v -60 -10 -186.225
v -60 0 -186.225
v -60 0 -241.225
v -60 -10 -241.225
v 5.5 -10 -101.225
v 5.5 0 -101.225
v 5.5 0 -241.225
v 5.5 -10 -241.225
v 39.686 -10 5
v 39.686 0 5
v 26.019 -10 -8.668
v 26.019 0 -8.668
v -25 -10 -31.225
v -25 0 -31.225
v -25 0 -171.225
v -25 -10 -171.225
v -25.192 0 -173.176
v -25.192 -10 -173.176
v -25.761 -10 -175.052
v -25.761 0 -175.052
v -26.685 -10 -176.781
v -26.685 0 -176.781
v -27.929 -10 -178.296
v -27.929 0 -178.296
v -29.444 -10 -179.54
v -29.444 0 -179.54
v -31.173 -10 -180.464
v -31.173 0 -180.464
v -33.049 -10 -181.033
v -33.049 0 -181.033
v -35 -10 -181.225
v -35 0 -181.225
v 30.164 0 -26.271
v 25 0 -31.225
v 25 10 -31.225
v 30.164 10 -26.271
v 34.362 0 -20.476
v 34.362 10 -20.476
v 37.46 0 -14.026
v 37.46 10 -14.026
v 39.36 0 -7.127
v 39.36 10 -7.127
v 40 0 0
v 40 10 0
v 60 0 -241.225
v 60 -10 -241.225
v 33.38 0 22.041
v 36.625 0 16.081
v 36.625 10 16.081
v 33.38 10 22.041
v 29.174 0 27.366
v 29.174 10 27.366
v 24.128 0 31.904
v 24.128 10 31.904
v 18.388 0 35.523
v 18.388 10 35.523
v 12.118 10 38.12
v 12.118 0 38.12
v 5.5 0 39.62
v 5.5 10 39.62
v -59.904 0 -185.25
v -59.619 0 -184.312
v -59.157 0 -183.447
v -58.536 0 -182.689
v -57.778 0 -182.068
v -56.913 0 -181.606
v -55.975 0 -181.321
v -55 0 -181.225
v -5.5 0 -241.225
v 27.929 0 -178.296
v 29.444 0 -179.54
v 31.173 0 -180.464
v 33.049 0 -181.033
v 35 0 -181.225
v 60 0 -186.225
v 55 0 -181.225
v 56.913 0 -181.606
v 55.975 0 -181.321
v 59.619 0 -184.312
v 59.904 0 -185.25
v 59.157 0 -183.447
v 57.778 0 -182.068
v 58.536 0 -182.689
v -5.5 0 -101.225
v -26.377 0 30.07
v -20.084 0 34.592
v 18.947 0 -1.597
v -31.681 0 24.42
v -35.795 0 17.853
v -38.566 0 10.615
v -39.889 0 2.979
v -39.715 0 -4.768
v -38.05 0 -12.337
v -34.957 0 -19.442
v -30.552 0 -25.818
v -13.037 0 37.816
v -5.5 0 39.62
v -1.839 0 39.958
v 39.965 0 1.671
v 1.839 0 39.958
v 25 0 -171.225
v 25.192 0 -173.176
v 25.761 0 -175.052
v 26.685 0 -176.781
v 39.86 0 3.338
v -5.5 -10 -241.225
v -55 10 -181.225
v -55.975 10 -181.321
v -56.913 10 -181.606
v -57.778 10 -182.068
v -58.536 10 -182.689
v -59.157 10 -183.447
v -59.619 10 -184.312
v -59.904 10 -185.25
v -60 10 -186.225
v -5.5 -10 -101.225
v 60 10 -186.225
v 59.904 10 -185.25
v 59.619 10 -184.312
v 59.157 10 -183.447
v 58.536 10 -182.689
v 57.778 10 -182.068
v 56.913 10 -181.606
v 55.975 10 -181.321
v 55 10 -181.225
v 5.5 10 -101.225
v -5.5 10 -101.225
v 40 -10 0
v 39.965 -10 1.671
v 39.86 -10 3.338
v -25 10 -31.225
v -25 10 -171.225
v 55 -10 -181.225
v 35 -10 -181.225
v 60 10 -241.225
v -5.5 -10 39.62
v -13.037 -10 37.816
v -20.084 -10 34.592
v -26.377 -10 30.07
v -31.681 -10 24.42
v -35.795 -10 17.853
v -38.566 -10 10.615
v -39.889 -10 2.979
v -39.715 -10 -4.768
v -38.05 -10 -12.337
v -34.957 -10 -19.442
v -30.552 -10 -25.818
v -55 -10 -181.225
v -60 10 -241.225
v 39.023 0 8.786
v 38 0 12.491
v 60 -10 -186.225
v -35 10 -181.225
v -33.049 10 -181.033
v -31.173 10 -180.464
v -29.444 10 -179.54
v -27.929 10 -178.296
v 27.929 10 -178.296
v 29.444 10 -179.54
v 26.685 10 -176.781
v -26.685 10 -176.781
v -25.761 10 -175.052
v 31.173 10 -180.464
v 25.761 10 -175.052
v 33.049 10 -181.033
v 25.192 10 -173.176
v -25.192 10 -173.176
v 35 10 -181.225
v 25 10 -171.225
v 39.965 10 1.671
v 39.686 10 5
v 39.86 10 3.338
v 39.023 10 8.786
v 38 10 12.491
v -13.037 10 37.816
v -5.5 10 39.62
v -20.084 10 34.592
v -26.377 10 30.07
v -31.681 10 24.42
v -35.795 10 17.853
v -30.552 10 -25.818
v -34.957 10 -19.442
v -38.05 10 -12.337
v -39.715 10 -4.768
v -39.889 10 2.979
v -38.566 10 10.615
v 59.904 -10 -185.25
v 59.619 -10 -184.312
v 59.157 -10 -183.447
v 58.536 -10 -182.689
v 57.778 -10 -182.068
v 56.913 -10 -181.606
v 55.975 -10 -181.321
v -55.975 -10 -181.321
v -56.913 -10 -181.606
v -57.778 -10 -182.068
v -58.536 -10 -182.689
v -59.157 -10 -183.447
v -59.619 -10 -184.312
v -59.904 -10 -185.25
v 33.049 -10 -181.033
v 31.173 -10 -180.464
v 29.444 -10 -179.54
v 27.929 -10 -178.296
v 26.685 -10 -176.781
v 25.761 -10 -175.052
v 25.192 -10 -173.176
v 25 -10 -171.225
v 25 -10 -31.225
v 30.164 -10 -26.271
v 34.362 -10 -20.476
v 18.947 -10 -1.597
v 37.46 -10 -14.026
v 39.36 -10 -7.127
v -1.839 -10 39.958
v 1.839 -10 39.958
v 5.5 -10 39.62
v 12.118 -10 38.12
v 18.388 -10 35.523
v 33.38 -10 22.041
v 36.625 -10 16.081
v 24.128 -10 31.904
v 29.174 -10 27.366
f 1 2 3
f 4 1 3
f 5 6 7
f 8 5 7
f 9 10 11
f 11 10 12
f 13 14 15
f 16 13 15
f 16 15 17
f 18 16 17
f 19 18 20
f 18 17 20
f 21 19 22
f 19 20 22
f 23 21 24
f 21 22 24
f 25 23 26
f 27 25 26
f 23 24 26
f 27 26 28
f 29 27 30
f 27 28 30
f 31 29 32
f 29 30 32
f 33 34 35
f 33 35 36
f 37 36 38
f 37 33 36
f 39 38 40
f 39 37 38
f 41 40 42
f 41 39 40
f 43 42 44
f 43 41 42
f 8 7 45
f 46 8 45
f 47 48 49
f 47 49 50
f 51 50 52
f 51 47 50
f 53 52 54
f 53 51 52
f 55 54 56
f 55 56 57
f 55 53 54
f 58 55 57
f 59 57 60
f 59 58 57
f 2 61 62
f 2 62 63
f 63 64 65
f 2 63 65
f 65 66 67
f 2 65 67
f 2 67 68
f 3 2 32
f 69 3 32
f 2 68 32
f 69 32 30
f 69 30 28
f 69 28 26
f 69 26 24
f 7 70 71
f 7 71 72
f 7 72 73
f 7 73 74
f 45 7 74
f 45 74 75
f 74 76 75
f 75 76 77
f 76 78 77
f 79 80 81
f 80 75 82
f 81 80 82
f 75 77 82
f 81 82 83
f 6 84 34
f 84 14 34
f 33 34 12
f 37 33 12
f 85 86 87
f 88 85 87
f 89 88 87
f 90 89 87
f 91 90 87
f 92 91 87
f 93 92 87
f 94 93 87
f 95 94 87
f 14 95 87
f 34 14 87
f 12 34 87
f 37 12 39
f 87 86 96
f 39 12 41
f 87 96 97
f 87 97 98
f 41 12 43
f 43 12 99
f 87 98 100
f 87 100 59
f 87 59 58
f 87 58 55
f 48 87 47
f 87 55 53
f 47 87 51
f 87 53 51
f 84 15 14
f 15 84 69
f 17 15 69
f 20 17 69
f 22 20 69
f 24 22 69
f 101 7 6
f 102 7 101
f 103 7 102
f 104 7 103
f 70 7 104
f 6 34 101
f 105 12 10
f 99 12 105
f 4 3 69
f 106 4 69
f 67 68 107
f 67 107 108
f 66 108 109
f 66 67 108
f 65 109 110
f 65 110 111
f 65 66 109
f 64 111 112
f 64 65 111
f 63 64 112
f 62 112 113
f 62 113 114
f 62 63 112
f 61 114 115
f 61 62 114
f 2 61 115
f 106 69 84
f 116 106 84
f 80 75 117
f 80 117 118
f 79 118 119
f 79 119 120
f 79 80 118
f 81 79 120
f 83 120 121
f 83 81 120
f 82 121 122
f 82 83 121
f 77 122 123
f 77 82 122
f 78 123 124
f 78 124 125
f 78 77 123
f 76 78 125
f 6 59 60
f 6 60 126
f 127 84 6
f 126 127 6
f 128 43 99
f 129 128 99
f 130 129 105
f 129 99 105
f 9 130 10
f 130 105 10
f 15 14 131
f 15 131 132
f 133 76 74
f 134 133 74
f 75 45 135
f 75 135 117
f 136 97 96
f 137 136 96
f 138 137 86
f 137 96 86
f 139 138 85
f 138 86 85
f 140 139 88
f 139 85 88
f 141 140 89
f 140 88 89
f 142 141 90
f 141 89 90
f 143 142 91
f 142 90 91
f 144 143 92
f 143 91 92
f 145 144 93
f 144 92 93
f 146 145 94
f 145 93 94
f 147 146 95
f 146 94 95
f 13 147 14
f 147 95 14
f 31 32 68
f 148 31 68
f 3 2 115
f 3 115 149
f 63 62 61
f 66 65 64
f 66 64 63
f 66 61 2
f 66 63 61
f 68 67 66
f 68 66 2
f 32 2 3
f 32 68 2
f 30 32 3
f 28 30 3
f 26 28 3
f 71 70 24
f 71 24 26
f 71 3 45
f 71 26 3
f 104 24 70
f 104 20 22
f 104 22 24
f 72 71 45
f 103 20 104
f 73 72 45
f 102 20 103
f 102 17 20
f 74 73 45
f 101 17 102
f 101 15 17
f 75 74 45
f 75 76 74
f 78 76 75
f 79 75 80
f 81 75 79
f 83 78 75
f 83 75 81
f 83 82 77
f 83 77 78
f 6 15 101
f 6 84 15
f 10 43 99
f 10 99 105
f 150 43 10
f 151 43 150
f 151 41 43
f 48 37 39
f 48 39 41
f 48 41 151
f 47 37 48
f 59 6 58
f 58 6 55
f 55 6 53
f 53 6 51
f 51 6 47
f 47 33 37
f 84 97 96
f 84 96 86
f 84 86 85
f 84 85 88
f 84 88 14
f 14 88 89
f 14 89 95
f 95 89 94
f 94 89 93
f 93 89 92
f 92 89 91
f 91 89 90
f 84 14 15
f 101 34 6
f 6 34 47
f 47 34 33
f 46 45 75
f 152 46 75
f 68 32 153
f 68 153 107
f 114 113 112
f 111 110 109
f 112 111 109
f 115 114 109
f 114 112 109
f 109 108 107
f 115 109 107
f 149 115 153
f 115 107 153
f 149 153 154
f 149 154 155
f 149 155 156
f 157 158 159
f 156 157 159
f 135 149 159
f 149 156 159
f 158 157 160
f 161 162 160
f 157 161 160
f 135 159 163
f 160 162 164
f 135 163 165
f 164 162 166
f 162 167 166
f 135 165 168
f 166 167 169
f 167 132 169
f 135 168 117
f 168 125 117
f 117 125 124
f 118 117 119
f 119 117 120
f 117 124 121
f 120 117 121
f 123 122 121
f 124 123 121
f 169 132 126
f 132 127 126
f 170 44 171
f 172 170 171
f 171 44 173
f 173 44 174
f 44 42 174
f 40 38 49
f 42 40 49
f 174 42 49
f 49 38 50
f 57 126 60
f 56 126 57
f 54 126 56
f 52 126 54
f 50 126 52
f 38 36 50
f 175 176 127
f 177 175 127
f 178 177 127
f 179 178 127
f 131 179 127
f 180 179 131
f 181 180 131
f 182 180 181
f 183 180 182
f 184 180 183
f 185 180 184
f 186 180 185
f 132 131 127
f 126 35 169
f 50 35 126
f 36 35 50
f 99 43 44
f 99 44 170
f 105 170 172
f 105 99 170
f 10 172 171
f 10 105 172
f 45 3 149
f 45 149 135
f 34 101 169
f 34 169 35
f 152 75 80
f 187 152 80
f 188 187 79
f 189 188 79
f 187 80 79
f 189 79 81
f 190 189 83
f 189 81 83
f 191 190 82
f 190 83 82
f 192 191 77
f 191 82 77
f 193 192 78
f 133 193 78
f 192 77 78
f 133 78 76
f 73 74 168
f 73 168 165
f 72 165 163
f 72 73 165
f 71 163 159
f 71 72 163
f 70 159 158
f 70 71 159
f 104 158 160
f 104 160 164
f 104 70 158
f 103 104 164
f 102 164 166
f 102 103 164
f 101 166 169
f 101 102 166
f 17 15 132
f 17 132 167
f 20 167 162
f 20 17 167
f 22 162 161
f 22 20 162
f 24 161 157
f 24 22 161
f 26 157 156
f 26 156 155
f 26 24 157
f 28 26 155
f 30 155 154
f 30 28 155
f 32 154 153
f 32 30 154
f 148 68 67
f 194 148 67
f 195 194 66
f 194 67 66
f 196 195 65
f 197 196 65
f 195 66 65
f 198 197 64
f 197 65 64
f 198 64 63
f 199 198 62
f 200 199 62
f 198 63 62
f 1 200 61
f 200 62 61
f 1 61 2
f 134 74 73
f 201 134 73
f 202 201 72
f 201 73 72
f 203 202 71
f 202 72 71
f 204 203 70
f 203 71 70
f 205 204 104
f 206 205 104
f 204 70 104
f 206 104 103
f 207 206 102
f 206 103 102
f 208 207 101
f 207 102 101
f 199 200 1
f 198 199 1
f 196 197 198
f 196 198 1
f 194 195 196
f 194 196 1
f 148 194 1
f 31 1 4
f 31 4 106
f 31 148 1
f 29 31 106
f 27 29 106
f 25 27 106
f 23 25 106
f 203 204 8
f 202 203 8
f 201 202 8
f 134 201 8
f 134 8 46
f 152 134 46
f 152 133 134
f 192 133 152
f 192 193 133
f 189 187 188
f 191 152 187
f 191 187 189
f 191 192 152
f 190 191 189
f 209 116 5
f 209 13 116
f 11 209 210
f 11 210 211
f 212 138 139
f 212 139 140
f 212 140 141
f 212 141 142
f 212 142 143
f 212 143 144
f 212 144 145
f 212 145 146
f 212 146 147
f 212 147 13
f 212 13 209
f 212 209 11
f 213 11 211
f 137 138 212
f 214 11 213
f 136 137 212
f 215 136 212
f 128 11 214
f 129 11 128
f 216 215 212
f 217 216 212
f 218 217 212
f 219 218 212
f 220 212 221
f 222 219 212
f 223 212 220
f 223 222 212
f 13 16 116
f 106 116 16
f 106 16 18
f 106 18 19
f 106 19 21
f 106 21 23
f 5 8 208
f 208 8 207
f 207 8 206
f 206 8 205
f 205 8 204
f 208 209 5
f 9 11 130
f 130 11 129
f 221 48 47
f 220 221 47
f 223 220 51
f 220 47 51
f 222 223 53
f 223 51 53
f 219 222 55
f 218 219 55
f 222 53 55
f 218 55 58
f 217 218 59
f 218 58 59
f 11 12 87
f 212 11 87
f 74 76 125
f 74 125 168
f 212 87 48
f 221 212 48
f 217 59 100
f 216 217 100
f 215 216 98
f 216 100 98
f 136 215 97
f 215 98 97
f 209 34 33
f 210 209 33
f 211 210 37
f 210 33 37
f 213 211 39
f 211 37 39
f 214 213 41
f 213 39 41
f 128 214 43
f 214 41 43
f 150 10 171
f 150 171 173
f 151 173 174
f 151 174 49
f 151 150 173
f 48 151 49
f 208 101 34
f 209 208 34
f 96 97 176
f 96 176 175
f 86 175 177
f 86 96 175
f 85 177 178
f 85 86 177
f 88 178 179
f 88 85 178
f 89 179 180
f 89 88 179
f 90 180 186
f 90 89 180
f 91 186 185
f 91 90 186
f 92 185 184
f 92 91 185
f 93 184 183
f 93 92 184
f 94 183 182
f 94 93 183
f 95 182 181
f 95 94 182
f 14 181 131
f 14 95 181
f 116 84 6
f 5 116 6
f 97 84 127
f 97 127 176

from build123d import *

# Parameters (mm, degrees)
F0_W     = 11
F0_H     = 70.8450606633
F1_DEPTH = 10
F0_H_2   = 60
F0_H_3   = 80
F2_DEPTH = 10


with BuildPart() as f1:
    # F0 (on Front) → F1 (new body)
    with BuildSketch(Plane.XZ):
        with BuildLine():
            Line((-5.5, 39.6200706713), (5.5, 39.6200706713))
            ThreePointArc((5.5, 39.6200706713), (0, 40), (-5.5, 39.6200706713))
        make_face()
        with BuildLine():
            Line((-25, -31.224989992), (-5.5, -31.224989992))
            Line((-5.5, -31.224989992), (-5.5, 39.6200706713))
            ThreePointArc((-5.5, 39.6200706713), (-38.5657640284, 10.6151705075), (-25, -31.224989992))
        make_face()
        with BuildLine():
            ThreePointArc((25, -31.224989992), (36.0555127546, -17.3205080757), (40, 0))
            ThreePointArc((40, 0), (39.9214903695, 2.5049165017), (39.686269666, 5))
            Line((39.686269666, 5), (26.0185417672, -8.6677278987))
            Line((26.0185417672, -8.6677278987), (18.9474739554, -1.5966600869))
            Line((18.9474739554, -1.5966600869), (36.625143485, 16.0810094428))
            ThreePointArc((36.625143485, 16.0810094428), (24.1278631314, 31.9037023041), (5.5, 39.6200706713))
            Line((5.5, 39.6200706713), (5.5, -31.224989992))
            Line((5.5, -31.224989992), (25, -31.224989992))
        make_face()
        with BuildLine():
            ThreePointArc((-25, -31.224989992), (-15.8171376963, -36.7398714627), (-5.5, -39.6200706713))
            Line((-5.5, -39.6200706713), (-5.5, -31.224989992))
            Line((-5.5, -31.224989992), (-25, -31.224989992))
        make_face()
        with BuildLine():
            ThreePointArc((5.5, -39.6200706713), (15.8171376963, -36.7398714627), (25, -31.224989992))
            Line((25, -31.224989992), (5.5, -31.224989992))
            Line((5.5, -31.224989992), (5.5, -39.6200706713))
        make_face()
        with BuildLine():
            Line((-5.5, -101.224989992), (-5.5, -39.6200706713))
            ThreePointArc((-5.5, -39.6200706713), (-15.8171376963, -36.7398714627), (-25, -31.224989992))
            Line((-25, -31.224989992), (-25, -171.224989992))
            ThreePointArc((-25, -171.224989992), (-27.9289321881, -178.2960578039), (-35, -181.224989992))
            Line((-35, -181.224989992), (-55, -181.224989992))
            ThreePointArc((-55, -181.224989992), (-58.5355339059, -182.6894560861), (-60, -186.224989992))
            Line((-60, -186.224989992), (-60, -241.224989992))
            Line((-60, -241.224989992), (-5.5, -241.224989992))
            Line((-5.5, -241.224989992), (-5.5, -181.224989992))
            Line((-5.5, -181.224989992), (-5.5, -101.224989992))
        make_face()
        with BuildLine():
            Line((25, -171.224989992), (25, -31.224989992))
            ThreePointArc((25, -31.224989992), (15.8171376963, -36.7398714627), (5.5, -39.6200706713))
            Line((5.5, -39.6200706713), (5.5, -101.224989992))
            Line((5.5, -101.224989992), (5.5, -181.224989992))
            Line((5.5, -181.224989992), (5.5, -241.224989992))
            Line((5.5, -241.224989992), (60, -241.224989992))
            Line((60, -241.224989992), (60, -186.224989992))
            ThreePointArc((60, -186.224989992), (58.5355339059, -182.6894560861), (55, -181.224989992))
            Line((55, -181.224989992), (35, -181.224989992))
            ThreePointArc((35, -181.224989992), (27.9289321881, -178.2960578039), (25, -171.224989992))
        make_face()
        with Locations((0, 4.1975403397)):
            Rectangle(F0_W, F0_H)
        with BuildLine():
            Line((5.5, -101.224989992), (5.5, -39.6200706713))
            ThreePointArc((5.5, -39.6200706713), (0, -40), (-5.5, -39.6200706713))
            Line((-5.5, -39.6200706713), (-5.5, -101.224989992))
            Line((-5.5, -101.224989992), (5.5, -101.224989992))
        make_face()
        with BuildLine():
            ThreePointArc((-5.5, -39.6200706713), (0, -40), (5.5, -39.6200706713))
            Line((5.5, -39.6200706713), (5.5, -31.224989992))
            Line((5.5, -31.224989992), (-5.5, -31.224989992))
            Line((-5.5, -31.224989992), (-5.5, -39.6200706713))
        make_face()
    extrude(amount=F1_DEPTH)


with BuildPart() as f2:
    # F0 (on Front) → F2 (new body)
    with BuildSketch(Plane.XZ):
        with BuildLine():
            ThreePointArc((25, -31.224989992), (36.0555127546, -17.3205080757), (40, 0))
            ThreePointArc((40, 0), (39.9214903695, 2.5049165017), (39.686269666, 5))
            Line((39.686269666, 5), (26.0185417672, -8.6677278987))
            Line((26.0185417672, -8.6677278987), (18.9474739554, -1.5966600869))
            Line((18.9474739554, -1.5966600869), (36.625143485, 16.0810094428))
            ThreePointArc((36.625143485, 16.0810094428), (24.1278631314, 31.9037023041), (5.5, 39.6200706713))
            Line((5.5, 39.6200706713), (5.5, -31.224989992))
            Line((5.5, -31.224989992), (25, -31.224989992))
        make_face()
        with BuildLine():
            Line((26.0185417672, -8.6677278987), (39.686269666, 5))
            ThreePointArc((39.686269666, 5), (38.5558703292, 10.6510498617), (36.625143485, 16.0810094428))
            Line((36.625143485, 16.0810094428), (18.9474739554, -1.5966600869))
            Line((18.9474739554, -1.5966600869), (26.0185417672, -8.6677278987))
        make_face()
        with BuildLine():
            Line((-25, -31.224989992), (-5.5, -31.224989992))
            Line((-5.5, -31.224989992), (-5.5, 39.6200706713))
            ThreePointArc((-5.5, 39.6200706713), (-38.5657640284, 10.6151705075), (-25, -31.224989992))
        make_face()
        with BuildLine():
            ThreePointArc((-25, -31.224989992), (-15.8171376963, -36.7398714627), (-5.5, -39.6200706713))
            Line((-5.5, -39.6200706713), (-5.5, -31.224989992))
            Line((-5.5, -31.224989992), (-25, -31.224989992))
        make_face()
        with BuildLine():
            ThreePointArc((5.5, -39.6200706713), (15.8171376963, -36.7398714627), (25, -31.224989992))
            Line((25, -31.224989992), (5.5, -31.224989992))
            Line((5.5, -31.224989992), (5.5, -39.6200706713))
        make_face()
        with BuildLine():
            Line((25, -171.224989992), (25, -31.224989992))
            ThreePointArc((25, -31.224989992), (15.8171376963, -36.7398714627), (5.5, -39.6200706713))
            Line((5.5, -39.6200706713), (5.5, -101.224989992))
            Line((5.5, -101.224989992), (5.5, -181.224989992))
            Line((5.5, -181.224989992), (5.5, -241.224989992))
            Line((5.5, -241.224989992), (60, -241.224989992))
            Line((60, -241.224989992), (60, -186.224989992))
            ThreePointArc((60, -186.224989992), (58.5355339059, -182.6894560861), (55, -181.224989992))
            Line((55, -181.224989992), (35, -181.224989992))
            ThreePointArc((35, -181.224989992), (27.9289321881, -178.2960578039), (25, -171.224989992))
        make_face()
        with BuildLine():
            Line((-5.5, -101.224989992), (-5.5, -39.6200706713))
            ThreePointArc((-5.5, -39.6200706713), (-15.8171376963, -36.7398714627), (-25, -31.224989992))
            Line((-25, -31.224989992), (-25, -171.224989992))
            ThreePointArc((-25, -171.224989992), (-27.9289321881, -178.2960578039), (-35, -181.224989992))
            Line((-35, -181.224989992), (-55, -181.224989992))
            ThreePointArc((-55, -181.224989992), (-58.5355339059, -182.6894560861), (-60, -186.224989992))
            Line((-60, -186.224989992), (-60, -241.224989992))
            Line((-60, -241.224989992), (-5.5, -241.224989992))
            Line((-5.5, -241.224989992), (-5.5, -181.224989992))
            Line((-5.5, -181.224989992), (-5.5, -101.224989992))
        make_face()
        with Locations((0, -211.224989992)):
            Rectangle(F0_W, F0_H_2)
        with Locations((0, -141.224989992)):
            Rectangle(F0_W, F0_H_3)
    extrude(amount=-F2_DEPTH)


solid = Compound([f1.part, f2.part])
